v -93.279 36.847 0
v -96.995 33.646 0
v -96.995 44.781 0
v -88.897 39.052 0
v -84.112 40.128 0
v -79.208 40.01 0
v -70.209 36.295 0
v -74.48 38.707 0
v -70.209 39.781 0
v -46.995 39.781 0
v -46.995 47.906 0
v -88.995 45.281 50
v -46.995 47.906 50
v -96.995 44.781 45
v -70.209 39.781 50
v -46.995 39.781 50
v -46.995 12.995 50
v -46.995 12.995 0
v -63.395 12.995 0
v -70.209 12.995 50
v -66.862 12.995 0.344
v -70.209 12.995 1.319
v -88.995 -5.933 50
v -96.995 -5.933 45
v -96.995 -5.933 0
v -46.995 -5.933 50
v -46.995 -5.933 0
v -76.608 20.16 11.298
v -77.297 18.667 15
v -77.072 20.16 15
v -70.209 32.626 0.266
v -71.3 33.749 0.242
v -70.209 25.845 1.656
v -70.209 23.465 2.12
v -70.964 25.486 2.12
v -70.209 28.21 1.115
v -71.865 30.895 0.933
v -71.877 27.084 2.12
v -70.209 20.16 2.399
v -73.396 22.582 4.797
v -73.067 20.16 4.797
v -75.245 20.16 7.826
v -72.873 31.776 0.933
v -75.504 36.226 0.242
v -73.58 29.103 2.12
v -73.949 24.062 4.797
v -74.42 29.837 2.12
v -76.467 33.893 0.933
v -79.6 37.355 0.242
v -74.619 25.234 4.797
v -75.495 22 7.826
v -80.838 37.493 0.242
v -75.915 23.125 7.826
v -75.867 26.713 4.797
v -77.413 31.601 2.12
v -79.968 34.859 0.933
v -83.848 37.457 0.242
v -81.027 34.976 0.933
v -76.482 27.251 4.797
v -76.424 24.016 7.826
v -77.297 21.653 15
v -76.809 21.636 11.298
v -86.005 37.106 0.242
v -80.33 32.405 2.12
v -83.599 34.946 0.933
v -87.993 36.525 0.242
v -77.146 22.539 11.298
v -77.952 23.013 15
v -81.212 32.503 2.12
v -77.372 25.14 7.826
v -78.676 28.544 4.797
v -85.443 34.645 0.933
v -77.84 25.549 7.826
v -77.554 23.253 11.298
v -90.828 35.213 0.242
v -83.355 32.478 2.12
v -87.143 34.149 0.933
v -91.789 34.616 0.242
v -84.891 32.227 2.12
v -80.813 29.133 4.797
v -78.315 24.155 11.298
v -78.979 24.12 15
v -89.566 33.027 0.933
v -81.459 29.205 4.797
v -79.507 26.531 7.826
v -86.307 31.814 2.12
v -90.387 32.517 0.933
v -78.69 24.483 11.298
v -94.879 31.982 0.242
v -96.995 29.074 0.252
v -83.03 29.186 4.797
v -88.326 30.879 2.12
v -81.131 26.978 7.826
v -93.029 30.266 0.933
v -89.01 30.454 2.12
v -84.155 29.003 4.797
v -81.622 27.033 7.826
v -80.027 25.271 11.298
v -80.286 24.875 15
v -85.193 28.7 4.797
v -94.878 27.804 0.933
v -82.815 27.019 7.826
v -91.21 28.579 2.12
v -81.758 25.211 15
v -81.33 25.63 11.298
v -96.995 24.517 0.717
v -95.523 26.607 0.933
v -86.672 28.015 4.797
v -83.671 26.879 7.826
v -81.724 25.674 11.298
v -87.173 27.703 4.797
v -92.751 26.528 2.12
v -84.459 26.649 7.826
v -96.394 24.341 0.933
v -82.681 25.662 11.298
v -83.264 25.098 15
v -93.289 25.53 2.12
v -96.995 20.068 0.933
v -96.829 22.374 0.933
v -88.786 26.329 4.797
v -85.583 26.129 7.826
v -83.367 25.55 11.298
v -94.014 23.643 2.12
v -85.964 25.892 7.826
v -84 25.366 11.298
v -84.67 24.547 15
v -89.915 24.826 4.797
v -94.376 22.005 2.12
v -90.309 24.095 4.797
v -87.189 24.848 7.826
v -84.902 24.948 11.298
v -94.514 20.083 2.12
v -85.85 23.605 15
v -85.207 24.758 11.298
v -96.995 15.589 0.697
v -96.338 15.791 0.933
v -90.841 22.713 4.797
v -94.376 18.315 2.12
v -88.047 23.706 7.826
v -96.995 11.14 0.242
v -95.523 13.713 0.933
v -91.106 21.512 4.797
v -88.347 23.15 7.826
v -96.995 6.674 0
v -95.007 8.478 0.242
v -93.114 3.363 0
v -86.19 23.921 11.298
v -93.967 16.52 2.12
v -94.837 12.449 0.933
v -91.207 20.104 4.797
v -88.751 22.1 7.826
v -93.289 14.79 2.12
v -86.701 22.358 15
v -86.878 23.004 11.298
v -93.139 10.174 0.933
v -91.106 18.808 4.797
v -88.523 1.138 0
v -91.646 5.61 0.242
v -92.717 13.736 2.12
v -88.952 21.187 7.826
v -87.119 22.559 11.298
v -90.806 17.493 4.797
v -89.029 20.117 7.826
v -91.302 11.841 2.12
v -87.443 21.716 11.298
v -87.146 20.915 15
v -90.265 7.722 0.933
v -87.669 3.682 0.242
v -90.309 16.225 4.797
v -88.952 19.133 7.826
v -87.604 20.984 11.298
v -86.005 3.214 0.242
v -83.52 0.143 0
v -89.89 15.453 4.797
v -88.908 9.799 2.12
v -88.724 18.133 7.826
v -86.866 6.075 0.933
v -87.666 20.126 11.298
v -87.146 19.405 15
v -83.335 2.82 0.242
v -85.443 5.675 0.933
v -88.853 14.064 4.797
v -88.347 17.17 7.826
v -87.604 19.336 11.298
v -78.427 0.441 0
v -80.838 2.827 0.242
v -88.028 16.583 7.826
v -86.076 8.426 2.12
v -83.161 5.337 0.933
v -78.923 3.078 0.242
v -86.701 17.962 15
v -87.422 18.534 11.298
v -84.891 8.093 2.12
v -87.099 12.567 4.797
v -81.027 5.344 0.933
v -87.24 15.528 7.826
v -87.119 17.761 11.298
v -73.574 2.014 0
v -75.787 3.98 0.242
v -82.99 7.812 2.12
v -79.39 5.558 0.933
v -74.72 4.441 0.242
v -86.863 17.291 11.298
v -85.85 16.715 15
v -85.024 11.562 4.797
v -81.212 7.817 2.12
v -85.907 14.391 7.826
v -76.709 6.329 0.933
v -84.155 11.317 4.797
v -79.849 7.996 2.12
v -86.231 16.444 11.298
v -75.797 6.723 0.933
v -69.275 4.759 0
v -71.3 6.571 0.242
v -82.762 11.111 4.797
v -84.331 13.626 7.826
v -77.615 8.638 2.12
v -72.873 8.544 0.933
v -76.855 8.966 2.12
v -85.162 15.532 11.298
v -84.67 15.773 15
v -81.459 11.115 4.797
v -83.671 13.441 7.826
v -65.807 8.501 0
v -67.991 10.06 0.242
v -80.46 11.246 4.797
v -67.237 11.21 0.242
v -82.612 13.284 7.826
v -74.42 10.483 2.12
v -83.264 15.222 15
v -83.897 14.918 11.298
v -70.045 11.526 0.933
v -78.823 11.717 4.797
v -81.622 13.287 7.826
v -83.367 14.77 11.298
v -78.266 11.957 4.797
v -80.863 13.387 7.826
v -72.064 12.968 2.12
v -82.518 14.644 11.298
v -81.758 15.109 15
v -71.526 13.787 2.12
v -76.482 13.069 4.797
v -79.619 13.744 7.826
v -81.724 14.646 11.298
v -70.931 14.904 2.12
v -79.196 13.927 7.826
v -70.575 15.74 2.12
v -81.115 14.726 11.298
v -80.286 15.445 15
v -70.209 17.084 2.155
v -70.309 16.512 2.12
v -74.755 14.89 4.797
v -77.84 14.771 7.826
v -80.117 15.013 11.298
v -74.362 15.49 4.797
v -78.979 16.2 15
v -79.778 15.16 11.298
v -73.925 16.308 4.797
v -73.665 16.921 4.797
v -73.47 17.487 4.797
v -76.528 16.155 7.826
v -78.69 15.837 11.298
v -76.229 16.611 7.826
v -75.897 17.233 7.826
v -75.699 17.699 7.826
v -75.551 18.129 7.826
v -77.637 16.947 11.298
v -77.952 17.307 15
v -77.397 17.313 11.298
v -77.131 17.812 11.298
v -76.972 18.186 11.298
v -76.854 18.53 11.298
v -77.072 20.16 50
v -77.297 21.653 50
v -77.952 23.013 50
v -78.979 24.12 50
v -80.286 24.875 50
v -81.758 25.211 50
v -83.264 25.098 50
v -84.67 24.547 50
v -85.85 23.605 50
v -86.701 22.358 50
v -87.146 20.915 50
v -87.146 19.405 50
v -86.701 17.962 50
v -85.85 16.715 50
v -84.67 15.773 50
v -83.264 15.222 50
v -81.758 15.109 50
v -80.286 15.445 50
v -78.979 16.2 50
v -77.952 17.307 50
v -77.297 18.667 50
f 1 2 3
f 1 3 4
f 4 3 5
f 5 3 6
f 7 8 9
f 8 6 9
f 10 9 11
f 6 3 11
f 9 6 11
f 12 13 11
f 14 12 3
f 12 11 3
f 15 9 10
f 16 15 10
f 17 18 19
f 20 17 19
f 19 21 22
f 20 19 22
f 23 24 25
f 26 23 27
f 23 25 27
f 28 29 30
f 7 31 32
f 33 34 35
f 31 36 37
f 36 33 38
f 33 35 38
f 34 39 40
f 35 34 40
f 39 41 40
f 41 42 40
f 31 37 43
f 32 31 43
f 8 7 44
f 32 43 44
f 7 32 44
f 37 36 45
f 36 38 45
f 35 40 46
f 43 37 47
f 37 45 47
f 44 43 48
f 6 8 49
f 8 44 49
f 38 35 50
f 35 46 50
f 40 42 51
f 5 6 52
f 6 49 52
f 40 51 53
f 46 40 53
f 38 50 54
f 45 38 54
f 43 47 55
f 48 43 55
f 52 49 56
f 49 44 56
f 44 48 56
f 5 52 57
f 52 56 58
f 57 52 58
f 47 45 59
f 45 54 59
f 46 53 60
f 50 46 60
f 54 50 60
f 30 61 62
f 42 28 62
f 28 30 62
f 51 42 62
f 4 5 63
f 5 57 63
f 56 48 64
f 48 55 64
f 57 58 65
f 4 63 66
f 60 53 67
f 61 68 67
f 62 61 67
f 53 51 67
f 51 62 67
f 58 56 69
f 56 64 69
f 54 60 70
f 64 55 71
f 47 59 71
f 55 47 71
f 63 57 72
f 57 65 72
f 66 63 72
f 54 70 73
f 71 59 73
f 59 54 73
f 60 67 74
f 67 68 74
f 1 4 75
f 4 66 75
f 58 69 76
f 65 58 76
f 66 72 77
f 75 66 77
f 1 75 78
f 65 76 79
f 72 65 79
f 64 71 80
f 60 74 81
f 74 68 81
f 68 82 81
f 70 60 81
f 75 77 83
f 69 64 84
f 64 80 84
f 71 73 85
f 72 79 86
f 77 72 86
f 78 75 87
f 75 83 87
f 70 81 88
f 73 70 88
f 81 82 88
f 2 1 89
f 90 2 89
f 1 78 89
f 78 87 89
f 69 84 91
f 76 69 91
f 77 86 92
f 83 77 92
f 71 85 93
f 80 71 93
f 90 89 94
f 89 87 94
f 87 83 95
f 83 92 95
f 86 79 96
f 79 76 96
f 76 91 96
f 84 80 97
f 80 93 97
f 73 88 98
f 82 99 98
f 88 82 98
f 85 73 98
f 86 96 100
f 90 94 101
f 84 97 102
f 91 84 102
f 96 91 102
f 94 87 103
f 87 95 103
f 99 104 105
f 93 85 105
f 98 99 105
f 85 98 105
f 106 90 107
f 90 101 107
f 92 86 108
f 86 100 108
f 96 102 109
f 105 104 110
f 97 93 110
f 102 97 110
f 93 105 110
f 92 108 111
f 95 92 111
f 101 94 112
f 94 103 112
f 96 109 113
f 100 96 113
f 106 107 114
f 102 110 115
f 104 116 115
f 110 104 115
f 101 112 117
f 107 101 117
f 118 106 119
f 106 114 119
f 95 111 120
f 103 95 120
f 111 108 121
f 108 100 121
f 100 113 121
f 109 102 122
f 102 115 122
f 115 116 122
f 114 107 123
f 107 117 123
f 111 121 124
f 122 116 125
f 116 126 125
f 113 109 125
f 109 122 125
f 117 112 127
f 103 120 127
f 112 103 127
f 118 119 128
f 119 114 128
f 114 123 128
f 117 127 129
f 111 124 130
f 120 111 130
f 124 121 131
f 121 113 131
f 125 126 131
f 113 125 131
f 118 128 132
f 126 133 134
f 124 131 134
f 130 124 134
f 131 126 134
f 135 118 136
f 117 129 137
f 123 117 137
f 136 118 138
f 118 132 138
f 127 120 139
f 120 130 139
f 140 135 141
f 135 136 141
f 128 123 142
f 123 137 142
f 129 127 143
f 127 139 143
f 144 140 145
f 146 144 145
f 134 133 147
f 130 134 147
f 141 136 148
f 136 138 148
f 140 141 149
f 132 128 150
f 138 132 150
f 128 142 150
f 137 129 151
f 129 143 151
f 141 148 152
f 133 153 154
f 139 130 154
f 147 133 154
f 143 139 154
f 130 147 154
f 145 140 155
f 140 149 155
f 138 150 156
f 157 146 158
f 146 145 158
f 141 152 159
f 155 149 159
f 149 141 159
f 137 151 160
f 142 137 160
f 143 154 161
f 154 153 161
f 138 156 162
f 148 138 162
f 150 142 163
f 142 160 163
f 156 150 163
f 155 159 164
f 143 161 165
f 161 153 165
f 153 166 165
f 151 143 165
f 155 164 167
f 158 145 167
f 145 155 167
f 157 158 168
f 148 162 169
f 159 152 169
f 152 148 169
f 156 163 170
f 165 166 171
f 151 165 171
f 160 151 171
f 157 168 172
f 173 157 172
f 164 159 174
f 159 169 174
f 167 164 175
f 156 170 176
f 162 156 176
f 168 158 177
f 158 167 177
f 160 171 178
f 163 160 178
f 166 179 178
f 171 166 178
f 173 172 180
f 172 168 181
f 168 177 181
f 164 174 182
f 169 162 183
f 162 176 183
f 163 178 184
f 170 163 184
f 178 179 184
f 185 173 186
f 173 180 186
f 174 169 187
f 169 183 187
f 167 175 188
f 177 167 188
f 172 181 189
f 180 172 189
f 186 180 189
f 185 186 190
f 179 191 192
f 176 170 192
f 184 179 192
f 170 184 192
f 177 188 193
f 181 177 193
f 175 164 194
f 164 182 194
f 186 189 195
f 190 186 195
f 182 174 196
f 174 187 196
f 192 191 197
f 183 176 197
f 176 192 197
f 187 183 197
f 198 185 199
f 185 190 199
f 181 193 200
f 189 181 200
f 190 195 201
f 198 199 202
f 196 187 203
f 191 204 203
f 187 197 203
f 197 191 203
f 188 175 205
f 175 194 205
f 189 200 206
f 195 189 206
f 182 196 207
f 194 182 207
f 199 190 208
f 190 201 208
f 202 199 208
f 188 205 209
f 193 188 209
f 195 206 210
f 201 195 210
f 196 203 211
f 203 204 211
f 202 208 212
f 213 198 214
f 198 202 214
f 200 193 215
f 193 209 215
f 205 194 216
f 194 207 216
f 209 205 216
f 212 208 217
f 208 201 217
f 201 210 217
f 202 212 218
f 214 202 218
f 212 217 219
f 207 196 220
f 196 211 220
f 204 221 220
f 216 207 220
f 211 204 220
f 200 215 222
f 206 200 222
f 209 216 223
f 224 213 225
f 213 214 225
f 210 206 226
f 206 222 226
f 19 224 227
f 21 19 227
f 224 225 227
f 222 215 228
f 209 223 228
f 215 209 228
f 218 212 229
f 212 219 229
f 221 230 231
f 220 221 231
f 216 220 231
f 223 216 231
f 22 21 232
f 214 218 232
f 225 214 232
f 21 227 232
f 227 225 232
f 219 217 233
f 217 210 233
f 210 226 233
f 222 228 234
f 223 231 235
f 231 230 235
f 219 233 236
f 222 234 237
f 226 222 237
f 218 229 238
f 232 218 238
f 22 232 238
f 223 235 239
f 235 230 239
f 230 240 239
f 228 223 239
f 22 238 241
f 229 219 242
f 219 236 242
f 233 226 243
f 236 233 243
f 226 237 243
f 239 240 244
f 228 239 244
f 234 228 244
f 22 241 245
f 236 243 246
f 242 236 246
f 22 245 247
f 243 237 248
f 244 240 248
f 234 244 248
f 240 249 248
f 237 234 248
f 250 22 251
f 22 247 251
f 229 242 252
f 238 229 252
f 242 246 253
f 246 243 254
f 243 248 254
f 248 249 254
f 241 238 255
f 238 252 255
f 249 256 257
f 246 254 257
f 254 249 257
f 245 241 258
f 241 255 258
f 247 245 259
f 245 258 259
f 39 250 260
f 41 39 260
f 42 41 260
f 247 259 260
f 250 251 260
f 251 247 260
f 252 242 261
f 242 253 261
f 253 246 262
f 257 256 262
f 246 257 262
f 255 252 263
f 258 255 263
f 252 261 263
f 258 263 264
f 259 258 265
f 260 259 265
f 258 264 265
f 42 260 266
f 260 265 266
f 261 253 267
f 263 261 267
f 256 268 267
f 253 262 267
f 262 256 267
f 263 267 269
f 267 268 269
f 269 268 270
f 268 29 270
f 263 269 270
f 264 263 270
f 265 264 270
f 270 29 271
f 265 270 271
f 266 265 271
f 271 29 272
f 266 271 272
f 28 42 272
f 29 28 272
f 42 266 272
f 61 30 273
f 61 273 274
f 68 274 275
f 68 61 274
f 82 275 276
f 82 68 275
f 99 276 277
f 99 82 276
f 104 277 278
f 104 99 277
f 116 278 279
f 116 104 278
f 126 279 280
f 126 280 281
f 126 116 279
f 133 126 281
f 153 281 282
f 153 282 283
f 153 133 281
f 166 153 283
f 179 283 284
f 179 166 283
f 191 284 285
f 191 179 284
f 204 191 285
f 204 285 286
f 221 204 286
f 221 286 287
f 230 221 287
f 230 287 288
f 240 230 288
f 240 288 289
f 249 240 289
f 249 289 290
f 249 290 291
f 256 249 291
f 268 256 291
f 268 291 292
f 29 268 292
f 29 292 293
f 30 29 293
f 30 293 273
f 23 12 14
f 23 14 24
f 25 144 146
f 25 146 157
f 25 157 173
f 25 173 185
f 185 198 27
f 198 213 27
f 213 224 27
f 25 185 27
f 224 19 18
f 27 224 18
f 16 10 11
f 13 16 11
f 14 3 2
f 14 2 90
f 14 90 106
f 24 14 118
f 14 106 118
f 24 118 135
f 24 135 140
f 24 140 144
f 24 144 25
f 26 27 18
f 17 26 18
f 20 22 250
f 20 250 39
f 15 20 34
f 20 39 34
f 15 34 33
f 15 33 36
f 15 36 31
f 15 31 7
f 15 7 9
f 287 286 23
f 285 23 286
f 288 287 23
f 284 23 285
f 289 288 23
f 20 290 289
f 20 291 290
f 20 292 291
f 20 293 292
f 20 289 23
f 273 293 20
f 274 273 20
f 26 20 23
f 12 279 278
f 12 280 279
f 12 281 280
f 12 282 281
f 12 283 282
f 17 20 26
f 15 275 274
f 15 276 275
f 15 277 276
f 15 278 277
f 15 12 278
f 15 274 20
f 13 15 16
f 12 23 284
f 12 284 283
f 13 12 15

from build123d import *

# Parameters (mm, degrees)
F0_R        = 5.0651423349
F1_DEPTH    = 50
F2_SIZE2    = 8
F2_SIZE     = 5
F4_T1_DEPTH = 460.97003859


# Not quite as in the source:
# - a fillet or chamfer that OpenCascade refuses, or shapes differently, is made with other operations: its cross-section is extruded or revolved along the edge and cut away or added


with BuildPart() as f1:
    # F0 (on Top) → F1 (new body)
    with BuildSketch(Plane.XY):
        Polygon((-70.2088537009, 12.9954309589), (-70.2088537009, 39.781139965), (-46.9945719463, 39.781139965), (-46.9945719463, 49.781139965), (-96.9945719463, 49.781139965), (-96.9945719463, -5.9331371699), (-46.9945719463, -5.9331371699), (-46.9945719463, 12.9954309589), align=None)
        with Locations((-82.137003541, 20.1600026339)):
            Circle(F0_R, mode=Mode.SUBTRACT)
    extrude(amount=F1_DEPTH)

    # F2
    f2_edges = [f1.edges().sort_by_distance(p)[0] for p in [
        (-96.994572, 21.924001, 50),
    ]]
    f2_side = f1.faces().sort_by_distance((-96.994572, 21.924001, 25))[0]
    chamfer(f2_edges, length=F2_SIZE, length2=F2_SIZE2, reference=f2_side)

    # F3: fillet of radius 15 on 1 edges, made by hand

    # F3_s1 → F3_t2 (revolve, cut)
    with BuildSketch(Plane.XZ.offset(-20.1600026339)):
        with BuildLine():
            ThreePointArc((-62.0718612061, 0), (-72.6784629239, 4.3933982822), (-77.0718612061, 15))
            Line((-77.0718612061, 15), (-77.0718612061, 0))
            Line((-77.0718612061, 0), (-62.0718612061, 0))
        make_face()
    revolve(axis=Axis((-82.137003541, 20.1600026339, 0), (0, 0, 1)), mode=Mode.SUBTRACT)

    # F4: chamfer of 5 x 80 on 1 edges, made by hand

    # F4_s2 → F4_t1 (cut)
    with BuildSketch(Plane.XY.offset(-207.985019295)):
        Polygon((-16.9945719463, 49.781139965), (-96.9945719463, 44.781139965), (-96.9945719463, 49.781139965), align=None)
    extrude(amount=F4_T1_DEPTH, mode=Mode.SUBTRACT)


solid = f1.part
